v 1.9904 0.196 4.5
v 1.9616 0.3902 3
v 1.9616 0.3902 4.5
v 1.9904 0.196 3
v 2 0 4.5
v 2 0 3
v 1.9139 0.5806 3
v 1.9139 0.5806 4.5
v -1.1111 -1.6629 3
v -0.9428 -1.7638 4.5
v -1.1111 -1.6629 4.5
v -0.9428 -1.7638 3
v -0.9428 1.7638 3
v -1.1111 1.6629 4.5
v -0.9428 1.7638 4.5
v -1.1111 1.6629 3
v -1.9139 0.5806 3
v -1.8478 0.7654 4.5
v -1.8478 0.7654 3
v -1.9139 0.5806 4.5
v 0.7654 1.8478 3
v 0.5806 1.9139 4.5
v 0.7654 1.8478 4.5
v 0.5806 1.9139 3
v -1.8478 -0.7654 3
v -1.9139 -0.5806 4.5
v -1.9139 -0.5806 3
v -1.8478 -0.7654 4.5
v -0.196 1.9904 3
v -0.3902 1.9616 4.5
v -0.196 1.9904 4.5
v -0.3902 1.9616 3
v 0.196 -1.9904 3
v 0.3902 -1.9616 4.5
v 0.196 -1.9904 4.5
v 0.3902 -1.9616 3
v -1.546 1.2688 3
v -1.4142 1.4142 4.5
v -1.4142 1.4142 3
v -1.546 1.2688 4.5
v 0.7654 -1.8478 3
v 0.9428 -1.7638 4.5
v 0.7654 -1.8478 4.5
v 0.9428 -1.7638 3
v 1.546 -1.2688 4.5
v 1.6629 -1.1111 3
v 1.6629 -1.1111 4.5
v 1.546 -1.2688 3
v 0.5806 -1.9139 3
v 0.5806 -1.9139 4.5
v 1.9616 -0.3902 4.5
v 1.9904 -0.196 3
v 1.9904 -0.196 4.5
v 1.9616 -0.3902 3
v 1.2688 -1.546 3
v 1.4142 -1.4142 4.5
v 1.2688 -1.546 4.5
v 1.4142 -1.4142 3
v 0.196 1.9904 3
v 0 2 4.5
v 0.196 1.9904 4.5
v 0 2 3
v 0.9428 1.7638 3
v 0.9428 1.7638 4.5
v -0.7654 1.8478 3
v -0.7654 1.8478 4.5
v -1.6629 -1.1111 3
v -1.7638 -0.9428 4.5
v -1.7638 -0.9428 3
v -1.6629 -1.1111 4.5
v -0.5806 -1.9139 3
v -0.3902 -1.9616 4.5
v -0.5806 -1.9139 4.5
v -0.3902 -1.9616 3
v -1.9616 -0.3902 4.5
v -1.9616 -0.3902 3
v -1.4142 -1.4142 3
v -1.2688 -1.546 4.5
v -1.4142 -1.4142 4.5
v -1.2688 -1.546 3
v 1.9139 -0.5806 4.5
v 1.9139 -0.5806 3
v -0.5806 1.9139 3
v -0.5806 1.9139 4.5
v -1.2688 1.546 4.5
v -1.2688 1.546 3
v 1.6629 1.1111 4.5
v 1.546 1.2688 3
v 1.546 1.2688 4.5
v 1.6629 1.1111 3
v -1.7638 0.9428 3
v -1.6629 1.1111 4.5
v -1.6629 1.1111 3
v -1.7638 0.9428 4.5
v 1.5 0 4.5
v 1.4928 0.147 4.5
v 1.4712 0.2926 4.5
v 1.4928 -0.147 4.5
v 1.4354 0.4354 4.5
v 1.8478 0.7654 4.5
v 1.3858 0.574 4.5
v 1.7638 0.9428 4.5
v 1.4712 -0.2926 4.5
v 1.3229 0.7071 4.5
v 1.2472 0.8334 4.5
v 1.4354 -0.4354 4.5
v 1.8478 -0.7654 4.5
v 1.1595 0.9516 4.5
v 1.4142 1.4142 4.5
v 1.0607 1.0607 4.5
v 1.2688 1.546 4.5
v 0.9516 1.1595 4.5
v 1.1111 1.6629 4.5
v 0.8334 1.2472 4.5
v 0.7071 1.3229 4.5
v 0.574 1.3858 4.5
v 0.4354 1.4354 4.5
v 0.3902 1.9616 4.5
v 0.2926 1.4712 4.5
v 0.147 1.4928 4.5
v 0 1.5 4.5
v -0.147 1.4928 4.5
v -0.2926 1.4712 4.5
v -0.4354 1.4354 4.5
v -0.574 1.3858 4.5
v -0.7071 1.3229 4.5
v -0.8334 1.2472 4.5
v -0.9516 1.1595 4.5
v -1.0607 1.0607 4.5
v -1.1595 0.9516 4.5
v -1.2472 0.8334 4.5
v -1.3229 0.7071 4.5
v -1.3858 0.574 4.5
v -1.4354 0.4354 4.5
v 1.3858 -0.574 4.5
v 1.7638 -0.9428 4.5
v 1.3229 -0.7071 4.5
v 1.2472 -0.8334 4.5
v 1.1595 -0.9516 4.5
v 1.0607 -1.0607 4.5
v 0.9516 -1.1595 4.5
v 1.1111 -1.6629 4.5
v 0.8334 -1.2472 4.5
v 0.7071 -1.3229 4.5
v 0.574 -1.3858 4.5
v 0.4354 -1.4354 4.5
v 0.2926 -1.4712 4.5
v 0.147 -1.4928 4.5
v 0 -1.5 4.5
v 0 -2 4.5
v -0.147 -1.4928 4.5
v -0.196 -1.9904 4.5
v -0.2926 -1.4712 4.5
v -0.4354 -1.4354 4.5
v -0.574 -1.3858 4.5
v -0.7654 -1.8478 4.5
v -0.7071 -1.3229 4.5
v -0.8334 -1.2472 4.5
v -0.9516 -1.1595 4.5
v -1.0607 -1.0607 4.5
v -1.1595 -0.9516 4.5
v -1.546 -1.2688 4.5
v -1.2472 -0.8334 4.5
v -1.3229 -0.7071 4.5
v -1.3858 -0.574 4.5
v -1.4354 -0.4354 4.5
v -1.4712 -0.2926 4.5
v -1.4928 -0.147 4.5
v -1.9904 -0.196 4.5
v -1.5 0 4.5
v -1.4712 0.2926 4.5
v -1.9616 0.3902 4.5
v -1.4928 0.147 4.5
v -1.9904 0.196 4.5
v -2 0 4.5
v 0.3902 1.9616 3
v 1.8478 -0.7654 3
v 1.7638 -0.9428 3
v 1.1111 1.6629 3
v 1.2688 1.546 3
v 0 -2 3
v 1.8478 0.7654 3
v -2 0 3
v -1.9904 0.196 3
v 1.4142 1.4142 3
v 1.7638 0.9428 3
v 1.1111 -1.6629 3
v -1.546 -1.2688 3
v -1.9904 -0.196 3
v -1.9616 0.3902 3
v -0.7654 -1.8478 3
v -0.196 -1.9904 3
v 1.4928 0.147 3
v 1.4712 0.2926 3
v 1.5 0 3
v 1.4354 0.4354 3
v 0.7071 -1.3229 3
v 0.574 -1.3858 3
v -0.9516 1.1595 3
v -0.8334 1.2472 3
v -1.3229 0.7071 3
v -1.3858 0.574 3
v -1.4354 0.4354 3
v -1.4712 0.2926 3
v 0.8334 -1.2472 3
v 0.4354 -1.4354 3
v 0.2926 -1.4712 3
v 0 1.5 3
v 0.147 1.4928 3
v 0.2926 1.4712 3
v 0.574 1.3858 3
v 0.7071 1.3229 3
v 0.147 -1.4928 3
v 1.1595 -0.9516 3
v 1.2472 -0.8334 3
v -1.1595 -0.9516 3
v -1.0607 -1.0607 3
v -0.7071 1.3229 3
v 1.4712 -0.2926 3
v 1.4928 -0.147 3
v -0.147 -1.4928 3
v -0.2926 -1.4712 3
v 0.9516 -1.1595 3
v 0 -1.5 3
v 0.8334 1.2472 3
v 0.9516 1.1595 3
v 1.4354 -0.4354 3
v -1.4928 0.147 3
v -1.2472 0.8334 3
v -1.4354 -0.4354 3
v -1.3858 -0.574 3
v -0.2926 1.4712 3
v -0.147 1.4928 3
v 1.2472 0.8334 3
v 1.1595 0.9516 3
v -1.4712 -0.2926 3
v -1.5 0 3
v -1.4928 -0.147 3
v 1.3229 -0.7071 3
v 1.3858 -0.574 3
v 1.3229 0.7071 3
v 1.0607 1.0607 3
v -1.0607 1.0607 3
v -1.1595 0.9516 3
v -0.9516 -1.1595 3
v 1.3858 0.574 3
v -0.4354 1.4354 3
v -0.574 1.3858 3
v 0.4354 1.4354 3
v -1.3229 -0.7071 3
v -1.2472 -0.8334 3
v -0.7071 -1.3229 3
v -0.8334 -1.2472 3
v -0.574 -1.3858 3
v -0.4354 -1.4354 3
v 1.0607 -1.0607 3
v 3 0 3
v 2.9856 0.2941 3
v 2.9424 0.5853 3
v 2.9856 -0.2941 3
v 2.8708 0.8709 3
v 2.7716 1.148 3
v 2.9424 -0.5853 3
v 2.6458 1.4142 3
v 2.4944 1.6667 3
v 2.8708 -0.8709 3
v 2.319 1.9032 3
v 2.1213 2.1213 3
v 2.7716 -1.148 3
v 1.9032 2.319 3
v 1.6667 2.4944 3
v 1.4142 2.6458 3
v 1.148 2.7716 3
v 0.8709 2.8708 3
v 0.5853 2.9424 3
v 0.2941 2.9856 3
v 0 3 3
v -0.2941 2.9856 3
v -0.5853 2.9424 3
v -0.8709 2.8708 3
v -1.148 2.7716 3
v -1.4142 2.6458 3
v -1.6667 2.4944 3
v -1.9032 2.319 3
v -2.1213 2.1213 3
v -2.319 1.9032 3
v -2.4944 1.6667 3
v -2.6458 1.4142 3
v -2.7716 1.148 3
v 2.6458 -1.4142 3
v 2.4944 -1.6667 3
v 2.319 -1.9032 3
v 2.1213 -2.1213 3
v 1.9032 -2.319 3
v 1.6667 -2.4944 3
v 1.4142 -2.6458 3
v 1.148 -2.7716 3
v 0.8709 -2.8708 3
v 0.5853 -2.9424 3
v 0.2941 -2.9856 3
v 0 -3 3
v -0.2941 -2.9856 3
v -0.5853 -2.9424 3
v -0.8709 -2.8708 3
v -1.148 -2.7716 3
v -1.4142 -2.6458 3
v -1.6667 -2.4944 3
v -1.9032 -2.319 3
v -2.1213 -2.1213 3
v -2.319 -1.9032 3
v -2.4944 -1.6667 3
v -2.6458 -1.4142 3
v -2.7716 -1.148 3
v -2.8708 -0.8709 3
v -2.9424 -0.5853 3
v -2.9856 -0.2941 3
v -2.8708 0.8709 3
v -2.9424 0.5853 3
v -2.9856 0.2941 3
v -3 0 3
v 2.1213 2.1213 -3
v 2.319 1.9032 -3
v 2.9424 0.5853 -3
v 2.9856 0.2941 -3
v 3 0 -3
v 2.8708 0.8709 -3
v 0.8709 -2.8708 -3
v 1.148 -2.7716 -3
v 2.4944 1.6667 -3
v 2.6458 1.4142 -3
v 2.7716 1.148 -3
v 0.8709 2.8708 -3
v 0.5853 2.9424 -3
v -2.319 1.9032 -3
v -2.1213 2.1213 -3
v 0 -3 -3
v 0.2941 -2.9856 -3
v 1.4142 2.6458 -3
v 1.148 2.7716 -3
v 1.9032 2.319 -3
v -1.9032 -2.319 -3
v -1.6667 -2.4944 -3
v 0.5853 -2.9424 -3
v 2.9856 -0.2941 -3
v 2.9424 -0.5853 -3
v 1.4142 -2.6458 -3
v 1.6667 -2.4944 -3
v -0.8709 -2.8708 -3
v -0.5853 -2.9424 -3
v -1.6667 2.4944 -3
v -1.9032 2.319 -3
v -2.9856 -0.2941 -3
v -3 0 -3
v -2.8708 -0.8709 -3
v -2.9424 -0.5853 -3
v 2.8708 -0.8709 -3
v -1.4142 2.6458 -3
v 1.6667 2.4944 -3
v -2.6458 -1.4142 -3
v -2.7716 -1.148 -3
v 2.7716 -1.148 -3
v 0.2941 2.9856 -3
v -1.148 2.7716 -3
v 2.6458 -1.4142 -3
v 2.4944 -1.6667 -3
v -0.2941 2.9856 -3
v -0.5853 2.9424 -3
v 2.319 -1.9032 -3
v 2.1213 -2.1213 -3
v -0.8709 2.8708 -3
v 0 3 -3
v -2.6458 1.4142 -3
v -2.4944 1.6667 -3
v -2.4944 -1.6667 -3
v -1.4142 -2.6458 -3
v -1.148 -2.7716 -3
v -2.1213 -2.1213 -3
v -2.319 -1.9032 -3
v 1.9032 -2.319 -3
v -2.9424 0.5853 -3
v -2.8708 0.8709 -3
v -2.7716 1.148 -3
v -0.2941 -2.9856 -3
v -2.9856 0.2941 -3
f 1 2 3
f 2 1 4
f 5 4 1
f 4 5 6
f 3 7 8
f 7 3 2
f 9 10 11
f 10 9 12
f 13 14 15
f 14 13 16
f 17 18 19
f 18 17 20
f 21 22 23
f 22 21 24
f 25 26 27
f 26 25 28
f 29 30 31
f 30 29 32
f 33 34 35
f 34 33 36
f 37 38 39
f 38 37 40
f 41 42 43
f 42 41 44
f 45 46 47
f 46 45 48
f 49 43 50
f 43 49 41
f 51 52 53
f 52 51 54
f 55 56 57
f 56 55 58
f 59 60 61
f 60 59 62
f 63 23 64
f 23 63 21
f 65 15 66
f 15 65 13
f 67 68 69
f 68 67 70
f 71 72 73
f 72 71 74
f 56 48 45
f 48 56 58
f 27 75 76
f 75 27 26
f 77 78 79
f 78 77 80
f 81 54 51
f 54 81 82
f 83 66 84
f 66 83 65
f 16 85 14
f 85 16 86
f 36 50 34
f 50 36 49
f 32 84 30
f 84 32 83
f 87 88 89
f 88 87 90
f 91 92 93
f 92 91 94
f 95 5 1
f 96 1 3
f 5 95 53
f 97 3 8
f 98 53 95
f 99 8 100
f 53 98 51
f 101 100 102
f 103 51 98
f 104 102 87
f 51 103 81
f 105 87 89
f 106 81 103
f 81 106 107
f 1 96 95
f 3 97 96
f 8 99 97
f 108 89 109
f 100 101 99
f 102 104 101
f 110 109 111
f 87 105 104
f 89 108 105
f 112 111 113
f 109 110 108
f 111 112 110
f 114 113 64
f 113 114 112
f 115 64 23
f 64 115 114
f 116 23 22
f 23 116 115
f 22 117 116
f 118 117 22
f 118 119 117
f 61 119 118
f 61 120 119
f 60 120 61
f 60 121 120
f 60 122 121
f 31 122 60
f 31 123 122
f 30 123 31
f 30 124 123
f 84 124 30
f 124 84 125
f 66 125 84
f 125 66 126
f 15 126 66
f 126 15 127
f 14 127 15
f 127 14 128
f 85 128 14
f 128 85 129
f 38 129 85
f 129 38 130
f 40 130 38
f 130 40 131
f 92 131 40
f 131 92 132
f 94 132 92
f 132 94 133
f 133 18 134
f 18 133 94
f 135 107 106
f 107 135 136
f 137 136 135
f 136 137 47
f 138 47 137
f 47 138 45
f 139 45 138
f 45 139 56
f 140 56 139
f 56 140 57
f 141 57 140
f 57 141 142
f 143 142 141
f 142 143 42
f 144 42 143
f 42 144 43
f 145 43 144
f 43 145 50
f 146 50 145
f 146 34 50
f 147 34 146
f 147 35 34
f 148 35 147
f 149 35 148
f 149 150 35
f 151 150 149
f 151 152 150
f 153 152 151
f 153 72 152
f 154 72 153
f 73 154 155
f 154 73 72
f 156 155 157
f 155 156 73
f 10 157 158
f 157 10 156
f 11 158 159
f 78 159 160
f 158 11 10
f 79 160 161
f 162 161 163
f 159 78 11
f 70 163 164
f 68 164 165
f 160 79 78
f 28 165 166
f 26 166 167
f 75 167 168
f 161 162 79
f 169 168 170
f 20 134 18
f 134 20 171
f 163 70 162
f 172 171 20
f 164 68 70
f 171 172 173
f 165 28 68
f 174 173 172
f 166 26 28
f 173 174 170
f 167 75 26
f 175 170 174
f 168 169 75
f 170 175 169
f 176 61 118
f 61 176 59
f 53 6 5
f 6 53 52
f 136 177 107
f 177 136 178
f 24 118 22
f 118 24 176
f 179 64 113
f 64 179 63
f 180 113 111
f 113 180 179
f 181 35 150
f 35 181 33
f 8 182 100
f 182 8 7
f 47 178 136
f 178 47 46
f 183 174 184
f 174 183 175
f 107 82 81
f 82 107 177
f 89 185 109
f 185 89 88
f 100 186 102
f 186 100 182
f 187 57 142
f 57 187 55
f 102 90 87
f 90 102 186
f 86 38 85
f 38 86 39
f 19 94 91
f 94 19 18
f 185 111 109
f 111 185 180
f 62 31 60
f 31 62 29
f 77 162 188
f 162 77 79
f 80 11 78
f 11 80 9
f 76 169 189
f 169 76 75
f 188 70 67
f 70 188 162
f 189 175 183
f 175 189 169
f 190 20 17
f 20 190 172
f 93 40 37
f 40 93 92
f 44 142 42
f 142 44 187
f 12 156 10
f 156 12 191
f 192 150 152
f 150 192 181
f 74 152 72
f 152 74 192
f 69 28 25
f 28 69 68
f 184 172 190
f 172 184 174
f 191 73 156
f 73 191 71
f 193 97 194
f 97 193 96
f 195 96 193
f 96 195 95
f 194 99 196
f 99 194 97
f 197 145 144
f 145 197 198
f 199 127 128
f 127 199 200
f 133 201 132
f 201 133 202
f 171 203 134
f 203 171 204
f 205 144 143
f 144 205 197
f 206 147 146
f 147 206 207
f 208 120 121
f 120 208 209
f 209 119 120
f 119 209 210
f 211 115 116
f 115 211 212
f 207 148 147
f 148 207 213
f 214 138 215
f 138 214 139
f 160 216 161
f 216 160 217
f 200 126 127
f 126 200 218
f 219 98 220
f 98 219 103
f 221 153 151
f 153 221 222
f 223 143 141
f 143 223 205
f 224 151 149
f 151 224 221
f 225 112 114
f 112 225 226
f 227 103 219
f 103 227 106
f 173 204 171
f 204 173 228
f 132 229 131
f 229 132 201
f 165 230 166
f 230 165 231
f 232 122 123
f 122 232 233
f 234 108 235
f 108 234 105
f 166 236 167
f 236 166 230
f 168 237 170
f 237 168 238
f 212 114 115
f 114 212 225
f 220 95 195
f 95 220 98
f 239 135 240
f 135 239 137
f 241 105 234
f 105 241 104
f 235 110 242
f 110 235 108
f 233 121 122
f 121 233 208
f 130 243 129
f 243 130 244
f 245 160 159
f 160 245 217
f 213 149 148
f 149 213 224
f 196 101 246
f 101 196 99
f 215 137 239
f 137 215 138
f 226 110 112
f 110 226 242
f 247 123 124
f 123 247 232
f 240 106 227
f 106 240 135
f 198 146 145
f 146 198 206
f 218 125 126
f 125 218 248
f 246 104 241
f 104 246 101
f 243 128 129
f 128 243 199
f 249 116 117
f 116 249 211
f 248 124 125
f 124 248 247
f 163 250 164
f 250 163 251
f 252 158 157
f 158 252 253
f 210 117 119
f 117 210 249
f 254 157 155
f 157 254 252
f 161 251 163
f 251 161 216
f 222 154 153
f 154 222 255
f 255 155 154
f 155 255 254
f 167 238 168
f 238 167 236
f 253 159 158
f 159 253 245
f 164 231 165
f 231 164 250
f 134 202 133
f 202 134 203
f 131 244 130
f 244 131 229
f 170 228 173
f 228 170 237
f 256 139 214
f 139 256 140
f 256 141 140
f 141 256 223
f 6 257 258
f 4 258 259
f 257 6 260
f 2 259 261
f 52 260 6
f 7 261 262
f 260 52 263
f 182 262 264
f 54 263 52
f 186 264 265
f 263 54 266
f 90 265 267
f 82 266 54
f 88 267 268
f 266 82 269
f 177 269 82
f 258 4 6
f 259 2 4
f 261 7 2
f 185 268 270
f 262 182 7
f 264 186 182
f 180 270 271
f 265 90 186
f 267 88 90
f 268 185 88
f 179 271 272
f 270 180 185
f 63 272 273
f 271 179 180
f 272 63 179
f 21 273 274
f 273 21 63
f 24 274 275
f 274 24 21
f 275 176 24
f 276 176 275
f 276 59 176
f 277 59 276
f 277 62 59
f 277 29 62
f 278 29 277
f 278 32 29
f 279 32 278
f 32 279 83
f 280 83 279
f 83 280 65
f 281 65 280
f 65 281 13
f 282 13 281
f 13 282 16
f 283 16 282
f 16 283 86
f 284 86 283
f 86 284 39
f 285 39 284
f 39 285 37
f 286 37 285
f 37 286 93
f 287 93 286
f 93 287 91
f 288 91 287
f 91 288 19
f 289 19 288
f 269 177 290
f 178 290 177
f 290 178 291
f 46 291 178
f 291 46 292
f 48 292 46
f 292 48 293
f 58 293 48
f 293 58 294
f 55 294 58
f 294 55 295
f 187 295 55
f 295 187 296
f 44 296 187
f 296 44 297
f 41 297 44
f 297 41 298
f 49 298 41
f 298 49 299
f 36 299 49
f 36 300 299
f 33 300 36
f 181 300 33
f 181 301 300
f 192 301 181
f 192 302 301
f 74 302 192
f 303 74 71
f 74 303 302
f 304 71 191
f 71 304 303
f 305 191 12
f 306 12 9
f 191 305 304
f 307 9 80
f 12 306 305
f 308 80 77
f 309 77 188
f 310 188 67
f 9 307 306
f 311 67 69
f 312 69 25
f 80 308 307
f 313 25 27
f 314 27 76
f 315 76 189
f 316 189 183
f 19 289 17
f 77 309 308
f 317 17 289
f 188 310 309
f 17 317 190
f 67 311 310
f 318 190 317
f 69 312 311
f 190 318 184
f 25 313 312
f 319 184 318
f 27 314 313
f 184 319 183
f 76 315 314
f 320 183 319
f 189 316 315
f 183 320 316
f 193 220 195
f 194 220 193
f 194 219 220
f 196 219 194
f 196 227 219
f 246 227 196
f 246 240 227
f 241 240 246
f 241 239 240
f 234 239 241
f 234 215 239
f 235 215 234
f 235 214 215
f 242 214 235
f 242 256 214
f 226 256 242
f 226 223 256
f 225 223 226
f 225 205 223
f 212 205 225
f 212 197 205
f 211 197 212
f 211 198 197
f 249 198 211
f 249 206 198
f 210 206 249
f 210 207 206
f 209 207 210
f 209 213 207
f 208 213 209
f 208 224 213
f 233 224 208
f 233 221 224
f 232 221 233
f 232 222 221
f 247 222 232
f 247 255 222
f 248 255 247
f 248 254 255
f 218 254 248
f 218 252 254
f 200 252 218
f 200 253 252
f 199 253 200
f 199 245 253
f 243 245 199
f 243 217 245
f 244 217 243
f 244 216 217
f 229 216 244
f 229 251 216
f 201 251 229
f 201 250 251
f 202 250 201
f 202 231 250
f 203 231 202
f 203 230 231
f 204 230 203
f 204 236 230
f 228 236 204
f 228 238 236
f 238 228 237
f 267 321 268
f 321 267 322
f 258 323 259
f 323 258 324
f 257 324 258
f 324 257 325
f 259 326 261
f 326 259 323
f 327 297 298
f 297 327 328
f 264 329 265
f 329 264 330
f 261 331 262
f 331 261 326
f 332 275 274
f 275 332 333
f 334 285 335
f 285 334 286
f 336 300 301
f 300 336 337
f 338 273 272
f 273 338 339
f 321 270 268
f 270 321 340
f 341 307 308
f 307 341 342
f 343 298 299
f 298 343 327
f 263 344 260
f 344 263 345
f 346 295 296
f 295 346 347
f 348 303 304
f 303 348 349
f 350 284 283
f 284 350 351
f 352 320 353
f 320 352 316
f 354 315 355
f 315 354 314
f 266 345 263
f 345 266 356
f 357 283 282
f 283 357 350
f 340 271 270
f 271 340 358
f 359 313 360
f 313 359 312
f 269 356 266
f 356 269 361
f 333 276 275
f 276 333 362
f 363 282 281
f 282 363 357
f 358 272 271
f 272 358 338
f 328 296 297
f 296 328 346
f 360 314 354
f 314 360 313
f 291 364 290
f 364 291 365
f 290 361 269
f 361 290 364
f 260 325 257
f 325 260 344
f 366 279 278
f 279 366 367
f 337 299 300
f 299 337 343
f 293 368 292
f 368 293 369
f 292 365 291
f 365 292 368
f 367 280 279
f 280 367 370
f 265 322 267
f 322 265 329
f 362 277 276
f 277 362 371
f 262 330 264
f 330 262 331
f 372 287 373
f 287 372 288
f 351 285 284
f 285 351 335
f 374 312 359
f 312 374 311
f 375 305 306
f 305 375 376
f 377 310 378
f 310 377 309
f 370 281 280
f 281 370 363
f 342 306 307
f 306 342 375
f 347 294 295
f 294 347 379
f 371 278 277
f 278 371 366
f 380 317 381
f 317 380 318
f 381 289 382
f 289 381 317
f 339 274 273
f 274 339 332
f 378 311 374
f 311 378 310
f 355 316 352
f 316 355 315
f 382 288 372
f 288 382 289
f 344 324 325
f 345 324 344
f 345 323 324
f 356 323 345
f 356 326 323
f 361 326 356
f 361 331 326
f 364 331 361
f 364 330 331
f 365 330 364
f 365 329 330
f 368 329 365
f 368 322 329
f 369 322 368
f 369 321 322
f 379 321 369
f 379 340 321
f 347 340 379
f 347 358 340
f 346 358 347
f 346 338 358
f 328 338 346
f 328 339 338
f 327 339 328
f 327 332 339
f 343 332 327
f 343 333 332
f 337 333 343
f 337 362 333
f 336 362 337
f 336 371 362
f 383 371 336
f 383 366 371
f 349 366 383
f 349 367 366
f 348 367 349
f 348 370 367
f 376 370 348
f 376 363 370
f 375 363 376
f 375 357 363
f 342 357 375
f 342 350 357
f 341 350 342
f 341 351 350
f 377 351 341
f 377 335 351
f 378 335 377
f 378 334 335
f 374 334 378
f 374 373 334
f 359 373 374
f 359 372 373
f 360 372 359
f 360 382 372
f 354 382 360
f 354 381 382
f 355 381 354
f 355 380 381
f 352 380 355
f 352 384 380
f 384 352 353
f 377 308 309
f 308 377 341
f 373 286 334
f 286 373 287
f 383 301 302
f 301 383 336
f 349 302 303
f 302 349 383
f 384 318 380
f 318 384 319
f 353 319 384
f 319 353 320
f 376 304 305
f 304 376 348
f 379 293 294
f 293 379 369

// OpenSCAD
module grub_screw() {
    $fn = 64;
    // Main body of the screw
    cylinder(h = 6, d = 6, center = true);
    
    // Hex socket
    translate([0, 0, 3])
        rotate([0, 0, 0])
            difference() {
                cylinder(h = 3, d = 4, center = true);
                rotate([0, 0, 0])
                    translate([0, 0, 1.5])
                        cylinder(h = 3, d = 3, center = true);
            }
}

grub_screw();
